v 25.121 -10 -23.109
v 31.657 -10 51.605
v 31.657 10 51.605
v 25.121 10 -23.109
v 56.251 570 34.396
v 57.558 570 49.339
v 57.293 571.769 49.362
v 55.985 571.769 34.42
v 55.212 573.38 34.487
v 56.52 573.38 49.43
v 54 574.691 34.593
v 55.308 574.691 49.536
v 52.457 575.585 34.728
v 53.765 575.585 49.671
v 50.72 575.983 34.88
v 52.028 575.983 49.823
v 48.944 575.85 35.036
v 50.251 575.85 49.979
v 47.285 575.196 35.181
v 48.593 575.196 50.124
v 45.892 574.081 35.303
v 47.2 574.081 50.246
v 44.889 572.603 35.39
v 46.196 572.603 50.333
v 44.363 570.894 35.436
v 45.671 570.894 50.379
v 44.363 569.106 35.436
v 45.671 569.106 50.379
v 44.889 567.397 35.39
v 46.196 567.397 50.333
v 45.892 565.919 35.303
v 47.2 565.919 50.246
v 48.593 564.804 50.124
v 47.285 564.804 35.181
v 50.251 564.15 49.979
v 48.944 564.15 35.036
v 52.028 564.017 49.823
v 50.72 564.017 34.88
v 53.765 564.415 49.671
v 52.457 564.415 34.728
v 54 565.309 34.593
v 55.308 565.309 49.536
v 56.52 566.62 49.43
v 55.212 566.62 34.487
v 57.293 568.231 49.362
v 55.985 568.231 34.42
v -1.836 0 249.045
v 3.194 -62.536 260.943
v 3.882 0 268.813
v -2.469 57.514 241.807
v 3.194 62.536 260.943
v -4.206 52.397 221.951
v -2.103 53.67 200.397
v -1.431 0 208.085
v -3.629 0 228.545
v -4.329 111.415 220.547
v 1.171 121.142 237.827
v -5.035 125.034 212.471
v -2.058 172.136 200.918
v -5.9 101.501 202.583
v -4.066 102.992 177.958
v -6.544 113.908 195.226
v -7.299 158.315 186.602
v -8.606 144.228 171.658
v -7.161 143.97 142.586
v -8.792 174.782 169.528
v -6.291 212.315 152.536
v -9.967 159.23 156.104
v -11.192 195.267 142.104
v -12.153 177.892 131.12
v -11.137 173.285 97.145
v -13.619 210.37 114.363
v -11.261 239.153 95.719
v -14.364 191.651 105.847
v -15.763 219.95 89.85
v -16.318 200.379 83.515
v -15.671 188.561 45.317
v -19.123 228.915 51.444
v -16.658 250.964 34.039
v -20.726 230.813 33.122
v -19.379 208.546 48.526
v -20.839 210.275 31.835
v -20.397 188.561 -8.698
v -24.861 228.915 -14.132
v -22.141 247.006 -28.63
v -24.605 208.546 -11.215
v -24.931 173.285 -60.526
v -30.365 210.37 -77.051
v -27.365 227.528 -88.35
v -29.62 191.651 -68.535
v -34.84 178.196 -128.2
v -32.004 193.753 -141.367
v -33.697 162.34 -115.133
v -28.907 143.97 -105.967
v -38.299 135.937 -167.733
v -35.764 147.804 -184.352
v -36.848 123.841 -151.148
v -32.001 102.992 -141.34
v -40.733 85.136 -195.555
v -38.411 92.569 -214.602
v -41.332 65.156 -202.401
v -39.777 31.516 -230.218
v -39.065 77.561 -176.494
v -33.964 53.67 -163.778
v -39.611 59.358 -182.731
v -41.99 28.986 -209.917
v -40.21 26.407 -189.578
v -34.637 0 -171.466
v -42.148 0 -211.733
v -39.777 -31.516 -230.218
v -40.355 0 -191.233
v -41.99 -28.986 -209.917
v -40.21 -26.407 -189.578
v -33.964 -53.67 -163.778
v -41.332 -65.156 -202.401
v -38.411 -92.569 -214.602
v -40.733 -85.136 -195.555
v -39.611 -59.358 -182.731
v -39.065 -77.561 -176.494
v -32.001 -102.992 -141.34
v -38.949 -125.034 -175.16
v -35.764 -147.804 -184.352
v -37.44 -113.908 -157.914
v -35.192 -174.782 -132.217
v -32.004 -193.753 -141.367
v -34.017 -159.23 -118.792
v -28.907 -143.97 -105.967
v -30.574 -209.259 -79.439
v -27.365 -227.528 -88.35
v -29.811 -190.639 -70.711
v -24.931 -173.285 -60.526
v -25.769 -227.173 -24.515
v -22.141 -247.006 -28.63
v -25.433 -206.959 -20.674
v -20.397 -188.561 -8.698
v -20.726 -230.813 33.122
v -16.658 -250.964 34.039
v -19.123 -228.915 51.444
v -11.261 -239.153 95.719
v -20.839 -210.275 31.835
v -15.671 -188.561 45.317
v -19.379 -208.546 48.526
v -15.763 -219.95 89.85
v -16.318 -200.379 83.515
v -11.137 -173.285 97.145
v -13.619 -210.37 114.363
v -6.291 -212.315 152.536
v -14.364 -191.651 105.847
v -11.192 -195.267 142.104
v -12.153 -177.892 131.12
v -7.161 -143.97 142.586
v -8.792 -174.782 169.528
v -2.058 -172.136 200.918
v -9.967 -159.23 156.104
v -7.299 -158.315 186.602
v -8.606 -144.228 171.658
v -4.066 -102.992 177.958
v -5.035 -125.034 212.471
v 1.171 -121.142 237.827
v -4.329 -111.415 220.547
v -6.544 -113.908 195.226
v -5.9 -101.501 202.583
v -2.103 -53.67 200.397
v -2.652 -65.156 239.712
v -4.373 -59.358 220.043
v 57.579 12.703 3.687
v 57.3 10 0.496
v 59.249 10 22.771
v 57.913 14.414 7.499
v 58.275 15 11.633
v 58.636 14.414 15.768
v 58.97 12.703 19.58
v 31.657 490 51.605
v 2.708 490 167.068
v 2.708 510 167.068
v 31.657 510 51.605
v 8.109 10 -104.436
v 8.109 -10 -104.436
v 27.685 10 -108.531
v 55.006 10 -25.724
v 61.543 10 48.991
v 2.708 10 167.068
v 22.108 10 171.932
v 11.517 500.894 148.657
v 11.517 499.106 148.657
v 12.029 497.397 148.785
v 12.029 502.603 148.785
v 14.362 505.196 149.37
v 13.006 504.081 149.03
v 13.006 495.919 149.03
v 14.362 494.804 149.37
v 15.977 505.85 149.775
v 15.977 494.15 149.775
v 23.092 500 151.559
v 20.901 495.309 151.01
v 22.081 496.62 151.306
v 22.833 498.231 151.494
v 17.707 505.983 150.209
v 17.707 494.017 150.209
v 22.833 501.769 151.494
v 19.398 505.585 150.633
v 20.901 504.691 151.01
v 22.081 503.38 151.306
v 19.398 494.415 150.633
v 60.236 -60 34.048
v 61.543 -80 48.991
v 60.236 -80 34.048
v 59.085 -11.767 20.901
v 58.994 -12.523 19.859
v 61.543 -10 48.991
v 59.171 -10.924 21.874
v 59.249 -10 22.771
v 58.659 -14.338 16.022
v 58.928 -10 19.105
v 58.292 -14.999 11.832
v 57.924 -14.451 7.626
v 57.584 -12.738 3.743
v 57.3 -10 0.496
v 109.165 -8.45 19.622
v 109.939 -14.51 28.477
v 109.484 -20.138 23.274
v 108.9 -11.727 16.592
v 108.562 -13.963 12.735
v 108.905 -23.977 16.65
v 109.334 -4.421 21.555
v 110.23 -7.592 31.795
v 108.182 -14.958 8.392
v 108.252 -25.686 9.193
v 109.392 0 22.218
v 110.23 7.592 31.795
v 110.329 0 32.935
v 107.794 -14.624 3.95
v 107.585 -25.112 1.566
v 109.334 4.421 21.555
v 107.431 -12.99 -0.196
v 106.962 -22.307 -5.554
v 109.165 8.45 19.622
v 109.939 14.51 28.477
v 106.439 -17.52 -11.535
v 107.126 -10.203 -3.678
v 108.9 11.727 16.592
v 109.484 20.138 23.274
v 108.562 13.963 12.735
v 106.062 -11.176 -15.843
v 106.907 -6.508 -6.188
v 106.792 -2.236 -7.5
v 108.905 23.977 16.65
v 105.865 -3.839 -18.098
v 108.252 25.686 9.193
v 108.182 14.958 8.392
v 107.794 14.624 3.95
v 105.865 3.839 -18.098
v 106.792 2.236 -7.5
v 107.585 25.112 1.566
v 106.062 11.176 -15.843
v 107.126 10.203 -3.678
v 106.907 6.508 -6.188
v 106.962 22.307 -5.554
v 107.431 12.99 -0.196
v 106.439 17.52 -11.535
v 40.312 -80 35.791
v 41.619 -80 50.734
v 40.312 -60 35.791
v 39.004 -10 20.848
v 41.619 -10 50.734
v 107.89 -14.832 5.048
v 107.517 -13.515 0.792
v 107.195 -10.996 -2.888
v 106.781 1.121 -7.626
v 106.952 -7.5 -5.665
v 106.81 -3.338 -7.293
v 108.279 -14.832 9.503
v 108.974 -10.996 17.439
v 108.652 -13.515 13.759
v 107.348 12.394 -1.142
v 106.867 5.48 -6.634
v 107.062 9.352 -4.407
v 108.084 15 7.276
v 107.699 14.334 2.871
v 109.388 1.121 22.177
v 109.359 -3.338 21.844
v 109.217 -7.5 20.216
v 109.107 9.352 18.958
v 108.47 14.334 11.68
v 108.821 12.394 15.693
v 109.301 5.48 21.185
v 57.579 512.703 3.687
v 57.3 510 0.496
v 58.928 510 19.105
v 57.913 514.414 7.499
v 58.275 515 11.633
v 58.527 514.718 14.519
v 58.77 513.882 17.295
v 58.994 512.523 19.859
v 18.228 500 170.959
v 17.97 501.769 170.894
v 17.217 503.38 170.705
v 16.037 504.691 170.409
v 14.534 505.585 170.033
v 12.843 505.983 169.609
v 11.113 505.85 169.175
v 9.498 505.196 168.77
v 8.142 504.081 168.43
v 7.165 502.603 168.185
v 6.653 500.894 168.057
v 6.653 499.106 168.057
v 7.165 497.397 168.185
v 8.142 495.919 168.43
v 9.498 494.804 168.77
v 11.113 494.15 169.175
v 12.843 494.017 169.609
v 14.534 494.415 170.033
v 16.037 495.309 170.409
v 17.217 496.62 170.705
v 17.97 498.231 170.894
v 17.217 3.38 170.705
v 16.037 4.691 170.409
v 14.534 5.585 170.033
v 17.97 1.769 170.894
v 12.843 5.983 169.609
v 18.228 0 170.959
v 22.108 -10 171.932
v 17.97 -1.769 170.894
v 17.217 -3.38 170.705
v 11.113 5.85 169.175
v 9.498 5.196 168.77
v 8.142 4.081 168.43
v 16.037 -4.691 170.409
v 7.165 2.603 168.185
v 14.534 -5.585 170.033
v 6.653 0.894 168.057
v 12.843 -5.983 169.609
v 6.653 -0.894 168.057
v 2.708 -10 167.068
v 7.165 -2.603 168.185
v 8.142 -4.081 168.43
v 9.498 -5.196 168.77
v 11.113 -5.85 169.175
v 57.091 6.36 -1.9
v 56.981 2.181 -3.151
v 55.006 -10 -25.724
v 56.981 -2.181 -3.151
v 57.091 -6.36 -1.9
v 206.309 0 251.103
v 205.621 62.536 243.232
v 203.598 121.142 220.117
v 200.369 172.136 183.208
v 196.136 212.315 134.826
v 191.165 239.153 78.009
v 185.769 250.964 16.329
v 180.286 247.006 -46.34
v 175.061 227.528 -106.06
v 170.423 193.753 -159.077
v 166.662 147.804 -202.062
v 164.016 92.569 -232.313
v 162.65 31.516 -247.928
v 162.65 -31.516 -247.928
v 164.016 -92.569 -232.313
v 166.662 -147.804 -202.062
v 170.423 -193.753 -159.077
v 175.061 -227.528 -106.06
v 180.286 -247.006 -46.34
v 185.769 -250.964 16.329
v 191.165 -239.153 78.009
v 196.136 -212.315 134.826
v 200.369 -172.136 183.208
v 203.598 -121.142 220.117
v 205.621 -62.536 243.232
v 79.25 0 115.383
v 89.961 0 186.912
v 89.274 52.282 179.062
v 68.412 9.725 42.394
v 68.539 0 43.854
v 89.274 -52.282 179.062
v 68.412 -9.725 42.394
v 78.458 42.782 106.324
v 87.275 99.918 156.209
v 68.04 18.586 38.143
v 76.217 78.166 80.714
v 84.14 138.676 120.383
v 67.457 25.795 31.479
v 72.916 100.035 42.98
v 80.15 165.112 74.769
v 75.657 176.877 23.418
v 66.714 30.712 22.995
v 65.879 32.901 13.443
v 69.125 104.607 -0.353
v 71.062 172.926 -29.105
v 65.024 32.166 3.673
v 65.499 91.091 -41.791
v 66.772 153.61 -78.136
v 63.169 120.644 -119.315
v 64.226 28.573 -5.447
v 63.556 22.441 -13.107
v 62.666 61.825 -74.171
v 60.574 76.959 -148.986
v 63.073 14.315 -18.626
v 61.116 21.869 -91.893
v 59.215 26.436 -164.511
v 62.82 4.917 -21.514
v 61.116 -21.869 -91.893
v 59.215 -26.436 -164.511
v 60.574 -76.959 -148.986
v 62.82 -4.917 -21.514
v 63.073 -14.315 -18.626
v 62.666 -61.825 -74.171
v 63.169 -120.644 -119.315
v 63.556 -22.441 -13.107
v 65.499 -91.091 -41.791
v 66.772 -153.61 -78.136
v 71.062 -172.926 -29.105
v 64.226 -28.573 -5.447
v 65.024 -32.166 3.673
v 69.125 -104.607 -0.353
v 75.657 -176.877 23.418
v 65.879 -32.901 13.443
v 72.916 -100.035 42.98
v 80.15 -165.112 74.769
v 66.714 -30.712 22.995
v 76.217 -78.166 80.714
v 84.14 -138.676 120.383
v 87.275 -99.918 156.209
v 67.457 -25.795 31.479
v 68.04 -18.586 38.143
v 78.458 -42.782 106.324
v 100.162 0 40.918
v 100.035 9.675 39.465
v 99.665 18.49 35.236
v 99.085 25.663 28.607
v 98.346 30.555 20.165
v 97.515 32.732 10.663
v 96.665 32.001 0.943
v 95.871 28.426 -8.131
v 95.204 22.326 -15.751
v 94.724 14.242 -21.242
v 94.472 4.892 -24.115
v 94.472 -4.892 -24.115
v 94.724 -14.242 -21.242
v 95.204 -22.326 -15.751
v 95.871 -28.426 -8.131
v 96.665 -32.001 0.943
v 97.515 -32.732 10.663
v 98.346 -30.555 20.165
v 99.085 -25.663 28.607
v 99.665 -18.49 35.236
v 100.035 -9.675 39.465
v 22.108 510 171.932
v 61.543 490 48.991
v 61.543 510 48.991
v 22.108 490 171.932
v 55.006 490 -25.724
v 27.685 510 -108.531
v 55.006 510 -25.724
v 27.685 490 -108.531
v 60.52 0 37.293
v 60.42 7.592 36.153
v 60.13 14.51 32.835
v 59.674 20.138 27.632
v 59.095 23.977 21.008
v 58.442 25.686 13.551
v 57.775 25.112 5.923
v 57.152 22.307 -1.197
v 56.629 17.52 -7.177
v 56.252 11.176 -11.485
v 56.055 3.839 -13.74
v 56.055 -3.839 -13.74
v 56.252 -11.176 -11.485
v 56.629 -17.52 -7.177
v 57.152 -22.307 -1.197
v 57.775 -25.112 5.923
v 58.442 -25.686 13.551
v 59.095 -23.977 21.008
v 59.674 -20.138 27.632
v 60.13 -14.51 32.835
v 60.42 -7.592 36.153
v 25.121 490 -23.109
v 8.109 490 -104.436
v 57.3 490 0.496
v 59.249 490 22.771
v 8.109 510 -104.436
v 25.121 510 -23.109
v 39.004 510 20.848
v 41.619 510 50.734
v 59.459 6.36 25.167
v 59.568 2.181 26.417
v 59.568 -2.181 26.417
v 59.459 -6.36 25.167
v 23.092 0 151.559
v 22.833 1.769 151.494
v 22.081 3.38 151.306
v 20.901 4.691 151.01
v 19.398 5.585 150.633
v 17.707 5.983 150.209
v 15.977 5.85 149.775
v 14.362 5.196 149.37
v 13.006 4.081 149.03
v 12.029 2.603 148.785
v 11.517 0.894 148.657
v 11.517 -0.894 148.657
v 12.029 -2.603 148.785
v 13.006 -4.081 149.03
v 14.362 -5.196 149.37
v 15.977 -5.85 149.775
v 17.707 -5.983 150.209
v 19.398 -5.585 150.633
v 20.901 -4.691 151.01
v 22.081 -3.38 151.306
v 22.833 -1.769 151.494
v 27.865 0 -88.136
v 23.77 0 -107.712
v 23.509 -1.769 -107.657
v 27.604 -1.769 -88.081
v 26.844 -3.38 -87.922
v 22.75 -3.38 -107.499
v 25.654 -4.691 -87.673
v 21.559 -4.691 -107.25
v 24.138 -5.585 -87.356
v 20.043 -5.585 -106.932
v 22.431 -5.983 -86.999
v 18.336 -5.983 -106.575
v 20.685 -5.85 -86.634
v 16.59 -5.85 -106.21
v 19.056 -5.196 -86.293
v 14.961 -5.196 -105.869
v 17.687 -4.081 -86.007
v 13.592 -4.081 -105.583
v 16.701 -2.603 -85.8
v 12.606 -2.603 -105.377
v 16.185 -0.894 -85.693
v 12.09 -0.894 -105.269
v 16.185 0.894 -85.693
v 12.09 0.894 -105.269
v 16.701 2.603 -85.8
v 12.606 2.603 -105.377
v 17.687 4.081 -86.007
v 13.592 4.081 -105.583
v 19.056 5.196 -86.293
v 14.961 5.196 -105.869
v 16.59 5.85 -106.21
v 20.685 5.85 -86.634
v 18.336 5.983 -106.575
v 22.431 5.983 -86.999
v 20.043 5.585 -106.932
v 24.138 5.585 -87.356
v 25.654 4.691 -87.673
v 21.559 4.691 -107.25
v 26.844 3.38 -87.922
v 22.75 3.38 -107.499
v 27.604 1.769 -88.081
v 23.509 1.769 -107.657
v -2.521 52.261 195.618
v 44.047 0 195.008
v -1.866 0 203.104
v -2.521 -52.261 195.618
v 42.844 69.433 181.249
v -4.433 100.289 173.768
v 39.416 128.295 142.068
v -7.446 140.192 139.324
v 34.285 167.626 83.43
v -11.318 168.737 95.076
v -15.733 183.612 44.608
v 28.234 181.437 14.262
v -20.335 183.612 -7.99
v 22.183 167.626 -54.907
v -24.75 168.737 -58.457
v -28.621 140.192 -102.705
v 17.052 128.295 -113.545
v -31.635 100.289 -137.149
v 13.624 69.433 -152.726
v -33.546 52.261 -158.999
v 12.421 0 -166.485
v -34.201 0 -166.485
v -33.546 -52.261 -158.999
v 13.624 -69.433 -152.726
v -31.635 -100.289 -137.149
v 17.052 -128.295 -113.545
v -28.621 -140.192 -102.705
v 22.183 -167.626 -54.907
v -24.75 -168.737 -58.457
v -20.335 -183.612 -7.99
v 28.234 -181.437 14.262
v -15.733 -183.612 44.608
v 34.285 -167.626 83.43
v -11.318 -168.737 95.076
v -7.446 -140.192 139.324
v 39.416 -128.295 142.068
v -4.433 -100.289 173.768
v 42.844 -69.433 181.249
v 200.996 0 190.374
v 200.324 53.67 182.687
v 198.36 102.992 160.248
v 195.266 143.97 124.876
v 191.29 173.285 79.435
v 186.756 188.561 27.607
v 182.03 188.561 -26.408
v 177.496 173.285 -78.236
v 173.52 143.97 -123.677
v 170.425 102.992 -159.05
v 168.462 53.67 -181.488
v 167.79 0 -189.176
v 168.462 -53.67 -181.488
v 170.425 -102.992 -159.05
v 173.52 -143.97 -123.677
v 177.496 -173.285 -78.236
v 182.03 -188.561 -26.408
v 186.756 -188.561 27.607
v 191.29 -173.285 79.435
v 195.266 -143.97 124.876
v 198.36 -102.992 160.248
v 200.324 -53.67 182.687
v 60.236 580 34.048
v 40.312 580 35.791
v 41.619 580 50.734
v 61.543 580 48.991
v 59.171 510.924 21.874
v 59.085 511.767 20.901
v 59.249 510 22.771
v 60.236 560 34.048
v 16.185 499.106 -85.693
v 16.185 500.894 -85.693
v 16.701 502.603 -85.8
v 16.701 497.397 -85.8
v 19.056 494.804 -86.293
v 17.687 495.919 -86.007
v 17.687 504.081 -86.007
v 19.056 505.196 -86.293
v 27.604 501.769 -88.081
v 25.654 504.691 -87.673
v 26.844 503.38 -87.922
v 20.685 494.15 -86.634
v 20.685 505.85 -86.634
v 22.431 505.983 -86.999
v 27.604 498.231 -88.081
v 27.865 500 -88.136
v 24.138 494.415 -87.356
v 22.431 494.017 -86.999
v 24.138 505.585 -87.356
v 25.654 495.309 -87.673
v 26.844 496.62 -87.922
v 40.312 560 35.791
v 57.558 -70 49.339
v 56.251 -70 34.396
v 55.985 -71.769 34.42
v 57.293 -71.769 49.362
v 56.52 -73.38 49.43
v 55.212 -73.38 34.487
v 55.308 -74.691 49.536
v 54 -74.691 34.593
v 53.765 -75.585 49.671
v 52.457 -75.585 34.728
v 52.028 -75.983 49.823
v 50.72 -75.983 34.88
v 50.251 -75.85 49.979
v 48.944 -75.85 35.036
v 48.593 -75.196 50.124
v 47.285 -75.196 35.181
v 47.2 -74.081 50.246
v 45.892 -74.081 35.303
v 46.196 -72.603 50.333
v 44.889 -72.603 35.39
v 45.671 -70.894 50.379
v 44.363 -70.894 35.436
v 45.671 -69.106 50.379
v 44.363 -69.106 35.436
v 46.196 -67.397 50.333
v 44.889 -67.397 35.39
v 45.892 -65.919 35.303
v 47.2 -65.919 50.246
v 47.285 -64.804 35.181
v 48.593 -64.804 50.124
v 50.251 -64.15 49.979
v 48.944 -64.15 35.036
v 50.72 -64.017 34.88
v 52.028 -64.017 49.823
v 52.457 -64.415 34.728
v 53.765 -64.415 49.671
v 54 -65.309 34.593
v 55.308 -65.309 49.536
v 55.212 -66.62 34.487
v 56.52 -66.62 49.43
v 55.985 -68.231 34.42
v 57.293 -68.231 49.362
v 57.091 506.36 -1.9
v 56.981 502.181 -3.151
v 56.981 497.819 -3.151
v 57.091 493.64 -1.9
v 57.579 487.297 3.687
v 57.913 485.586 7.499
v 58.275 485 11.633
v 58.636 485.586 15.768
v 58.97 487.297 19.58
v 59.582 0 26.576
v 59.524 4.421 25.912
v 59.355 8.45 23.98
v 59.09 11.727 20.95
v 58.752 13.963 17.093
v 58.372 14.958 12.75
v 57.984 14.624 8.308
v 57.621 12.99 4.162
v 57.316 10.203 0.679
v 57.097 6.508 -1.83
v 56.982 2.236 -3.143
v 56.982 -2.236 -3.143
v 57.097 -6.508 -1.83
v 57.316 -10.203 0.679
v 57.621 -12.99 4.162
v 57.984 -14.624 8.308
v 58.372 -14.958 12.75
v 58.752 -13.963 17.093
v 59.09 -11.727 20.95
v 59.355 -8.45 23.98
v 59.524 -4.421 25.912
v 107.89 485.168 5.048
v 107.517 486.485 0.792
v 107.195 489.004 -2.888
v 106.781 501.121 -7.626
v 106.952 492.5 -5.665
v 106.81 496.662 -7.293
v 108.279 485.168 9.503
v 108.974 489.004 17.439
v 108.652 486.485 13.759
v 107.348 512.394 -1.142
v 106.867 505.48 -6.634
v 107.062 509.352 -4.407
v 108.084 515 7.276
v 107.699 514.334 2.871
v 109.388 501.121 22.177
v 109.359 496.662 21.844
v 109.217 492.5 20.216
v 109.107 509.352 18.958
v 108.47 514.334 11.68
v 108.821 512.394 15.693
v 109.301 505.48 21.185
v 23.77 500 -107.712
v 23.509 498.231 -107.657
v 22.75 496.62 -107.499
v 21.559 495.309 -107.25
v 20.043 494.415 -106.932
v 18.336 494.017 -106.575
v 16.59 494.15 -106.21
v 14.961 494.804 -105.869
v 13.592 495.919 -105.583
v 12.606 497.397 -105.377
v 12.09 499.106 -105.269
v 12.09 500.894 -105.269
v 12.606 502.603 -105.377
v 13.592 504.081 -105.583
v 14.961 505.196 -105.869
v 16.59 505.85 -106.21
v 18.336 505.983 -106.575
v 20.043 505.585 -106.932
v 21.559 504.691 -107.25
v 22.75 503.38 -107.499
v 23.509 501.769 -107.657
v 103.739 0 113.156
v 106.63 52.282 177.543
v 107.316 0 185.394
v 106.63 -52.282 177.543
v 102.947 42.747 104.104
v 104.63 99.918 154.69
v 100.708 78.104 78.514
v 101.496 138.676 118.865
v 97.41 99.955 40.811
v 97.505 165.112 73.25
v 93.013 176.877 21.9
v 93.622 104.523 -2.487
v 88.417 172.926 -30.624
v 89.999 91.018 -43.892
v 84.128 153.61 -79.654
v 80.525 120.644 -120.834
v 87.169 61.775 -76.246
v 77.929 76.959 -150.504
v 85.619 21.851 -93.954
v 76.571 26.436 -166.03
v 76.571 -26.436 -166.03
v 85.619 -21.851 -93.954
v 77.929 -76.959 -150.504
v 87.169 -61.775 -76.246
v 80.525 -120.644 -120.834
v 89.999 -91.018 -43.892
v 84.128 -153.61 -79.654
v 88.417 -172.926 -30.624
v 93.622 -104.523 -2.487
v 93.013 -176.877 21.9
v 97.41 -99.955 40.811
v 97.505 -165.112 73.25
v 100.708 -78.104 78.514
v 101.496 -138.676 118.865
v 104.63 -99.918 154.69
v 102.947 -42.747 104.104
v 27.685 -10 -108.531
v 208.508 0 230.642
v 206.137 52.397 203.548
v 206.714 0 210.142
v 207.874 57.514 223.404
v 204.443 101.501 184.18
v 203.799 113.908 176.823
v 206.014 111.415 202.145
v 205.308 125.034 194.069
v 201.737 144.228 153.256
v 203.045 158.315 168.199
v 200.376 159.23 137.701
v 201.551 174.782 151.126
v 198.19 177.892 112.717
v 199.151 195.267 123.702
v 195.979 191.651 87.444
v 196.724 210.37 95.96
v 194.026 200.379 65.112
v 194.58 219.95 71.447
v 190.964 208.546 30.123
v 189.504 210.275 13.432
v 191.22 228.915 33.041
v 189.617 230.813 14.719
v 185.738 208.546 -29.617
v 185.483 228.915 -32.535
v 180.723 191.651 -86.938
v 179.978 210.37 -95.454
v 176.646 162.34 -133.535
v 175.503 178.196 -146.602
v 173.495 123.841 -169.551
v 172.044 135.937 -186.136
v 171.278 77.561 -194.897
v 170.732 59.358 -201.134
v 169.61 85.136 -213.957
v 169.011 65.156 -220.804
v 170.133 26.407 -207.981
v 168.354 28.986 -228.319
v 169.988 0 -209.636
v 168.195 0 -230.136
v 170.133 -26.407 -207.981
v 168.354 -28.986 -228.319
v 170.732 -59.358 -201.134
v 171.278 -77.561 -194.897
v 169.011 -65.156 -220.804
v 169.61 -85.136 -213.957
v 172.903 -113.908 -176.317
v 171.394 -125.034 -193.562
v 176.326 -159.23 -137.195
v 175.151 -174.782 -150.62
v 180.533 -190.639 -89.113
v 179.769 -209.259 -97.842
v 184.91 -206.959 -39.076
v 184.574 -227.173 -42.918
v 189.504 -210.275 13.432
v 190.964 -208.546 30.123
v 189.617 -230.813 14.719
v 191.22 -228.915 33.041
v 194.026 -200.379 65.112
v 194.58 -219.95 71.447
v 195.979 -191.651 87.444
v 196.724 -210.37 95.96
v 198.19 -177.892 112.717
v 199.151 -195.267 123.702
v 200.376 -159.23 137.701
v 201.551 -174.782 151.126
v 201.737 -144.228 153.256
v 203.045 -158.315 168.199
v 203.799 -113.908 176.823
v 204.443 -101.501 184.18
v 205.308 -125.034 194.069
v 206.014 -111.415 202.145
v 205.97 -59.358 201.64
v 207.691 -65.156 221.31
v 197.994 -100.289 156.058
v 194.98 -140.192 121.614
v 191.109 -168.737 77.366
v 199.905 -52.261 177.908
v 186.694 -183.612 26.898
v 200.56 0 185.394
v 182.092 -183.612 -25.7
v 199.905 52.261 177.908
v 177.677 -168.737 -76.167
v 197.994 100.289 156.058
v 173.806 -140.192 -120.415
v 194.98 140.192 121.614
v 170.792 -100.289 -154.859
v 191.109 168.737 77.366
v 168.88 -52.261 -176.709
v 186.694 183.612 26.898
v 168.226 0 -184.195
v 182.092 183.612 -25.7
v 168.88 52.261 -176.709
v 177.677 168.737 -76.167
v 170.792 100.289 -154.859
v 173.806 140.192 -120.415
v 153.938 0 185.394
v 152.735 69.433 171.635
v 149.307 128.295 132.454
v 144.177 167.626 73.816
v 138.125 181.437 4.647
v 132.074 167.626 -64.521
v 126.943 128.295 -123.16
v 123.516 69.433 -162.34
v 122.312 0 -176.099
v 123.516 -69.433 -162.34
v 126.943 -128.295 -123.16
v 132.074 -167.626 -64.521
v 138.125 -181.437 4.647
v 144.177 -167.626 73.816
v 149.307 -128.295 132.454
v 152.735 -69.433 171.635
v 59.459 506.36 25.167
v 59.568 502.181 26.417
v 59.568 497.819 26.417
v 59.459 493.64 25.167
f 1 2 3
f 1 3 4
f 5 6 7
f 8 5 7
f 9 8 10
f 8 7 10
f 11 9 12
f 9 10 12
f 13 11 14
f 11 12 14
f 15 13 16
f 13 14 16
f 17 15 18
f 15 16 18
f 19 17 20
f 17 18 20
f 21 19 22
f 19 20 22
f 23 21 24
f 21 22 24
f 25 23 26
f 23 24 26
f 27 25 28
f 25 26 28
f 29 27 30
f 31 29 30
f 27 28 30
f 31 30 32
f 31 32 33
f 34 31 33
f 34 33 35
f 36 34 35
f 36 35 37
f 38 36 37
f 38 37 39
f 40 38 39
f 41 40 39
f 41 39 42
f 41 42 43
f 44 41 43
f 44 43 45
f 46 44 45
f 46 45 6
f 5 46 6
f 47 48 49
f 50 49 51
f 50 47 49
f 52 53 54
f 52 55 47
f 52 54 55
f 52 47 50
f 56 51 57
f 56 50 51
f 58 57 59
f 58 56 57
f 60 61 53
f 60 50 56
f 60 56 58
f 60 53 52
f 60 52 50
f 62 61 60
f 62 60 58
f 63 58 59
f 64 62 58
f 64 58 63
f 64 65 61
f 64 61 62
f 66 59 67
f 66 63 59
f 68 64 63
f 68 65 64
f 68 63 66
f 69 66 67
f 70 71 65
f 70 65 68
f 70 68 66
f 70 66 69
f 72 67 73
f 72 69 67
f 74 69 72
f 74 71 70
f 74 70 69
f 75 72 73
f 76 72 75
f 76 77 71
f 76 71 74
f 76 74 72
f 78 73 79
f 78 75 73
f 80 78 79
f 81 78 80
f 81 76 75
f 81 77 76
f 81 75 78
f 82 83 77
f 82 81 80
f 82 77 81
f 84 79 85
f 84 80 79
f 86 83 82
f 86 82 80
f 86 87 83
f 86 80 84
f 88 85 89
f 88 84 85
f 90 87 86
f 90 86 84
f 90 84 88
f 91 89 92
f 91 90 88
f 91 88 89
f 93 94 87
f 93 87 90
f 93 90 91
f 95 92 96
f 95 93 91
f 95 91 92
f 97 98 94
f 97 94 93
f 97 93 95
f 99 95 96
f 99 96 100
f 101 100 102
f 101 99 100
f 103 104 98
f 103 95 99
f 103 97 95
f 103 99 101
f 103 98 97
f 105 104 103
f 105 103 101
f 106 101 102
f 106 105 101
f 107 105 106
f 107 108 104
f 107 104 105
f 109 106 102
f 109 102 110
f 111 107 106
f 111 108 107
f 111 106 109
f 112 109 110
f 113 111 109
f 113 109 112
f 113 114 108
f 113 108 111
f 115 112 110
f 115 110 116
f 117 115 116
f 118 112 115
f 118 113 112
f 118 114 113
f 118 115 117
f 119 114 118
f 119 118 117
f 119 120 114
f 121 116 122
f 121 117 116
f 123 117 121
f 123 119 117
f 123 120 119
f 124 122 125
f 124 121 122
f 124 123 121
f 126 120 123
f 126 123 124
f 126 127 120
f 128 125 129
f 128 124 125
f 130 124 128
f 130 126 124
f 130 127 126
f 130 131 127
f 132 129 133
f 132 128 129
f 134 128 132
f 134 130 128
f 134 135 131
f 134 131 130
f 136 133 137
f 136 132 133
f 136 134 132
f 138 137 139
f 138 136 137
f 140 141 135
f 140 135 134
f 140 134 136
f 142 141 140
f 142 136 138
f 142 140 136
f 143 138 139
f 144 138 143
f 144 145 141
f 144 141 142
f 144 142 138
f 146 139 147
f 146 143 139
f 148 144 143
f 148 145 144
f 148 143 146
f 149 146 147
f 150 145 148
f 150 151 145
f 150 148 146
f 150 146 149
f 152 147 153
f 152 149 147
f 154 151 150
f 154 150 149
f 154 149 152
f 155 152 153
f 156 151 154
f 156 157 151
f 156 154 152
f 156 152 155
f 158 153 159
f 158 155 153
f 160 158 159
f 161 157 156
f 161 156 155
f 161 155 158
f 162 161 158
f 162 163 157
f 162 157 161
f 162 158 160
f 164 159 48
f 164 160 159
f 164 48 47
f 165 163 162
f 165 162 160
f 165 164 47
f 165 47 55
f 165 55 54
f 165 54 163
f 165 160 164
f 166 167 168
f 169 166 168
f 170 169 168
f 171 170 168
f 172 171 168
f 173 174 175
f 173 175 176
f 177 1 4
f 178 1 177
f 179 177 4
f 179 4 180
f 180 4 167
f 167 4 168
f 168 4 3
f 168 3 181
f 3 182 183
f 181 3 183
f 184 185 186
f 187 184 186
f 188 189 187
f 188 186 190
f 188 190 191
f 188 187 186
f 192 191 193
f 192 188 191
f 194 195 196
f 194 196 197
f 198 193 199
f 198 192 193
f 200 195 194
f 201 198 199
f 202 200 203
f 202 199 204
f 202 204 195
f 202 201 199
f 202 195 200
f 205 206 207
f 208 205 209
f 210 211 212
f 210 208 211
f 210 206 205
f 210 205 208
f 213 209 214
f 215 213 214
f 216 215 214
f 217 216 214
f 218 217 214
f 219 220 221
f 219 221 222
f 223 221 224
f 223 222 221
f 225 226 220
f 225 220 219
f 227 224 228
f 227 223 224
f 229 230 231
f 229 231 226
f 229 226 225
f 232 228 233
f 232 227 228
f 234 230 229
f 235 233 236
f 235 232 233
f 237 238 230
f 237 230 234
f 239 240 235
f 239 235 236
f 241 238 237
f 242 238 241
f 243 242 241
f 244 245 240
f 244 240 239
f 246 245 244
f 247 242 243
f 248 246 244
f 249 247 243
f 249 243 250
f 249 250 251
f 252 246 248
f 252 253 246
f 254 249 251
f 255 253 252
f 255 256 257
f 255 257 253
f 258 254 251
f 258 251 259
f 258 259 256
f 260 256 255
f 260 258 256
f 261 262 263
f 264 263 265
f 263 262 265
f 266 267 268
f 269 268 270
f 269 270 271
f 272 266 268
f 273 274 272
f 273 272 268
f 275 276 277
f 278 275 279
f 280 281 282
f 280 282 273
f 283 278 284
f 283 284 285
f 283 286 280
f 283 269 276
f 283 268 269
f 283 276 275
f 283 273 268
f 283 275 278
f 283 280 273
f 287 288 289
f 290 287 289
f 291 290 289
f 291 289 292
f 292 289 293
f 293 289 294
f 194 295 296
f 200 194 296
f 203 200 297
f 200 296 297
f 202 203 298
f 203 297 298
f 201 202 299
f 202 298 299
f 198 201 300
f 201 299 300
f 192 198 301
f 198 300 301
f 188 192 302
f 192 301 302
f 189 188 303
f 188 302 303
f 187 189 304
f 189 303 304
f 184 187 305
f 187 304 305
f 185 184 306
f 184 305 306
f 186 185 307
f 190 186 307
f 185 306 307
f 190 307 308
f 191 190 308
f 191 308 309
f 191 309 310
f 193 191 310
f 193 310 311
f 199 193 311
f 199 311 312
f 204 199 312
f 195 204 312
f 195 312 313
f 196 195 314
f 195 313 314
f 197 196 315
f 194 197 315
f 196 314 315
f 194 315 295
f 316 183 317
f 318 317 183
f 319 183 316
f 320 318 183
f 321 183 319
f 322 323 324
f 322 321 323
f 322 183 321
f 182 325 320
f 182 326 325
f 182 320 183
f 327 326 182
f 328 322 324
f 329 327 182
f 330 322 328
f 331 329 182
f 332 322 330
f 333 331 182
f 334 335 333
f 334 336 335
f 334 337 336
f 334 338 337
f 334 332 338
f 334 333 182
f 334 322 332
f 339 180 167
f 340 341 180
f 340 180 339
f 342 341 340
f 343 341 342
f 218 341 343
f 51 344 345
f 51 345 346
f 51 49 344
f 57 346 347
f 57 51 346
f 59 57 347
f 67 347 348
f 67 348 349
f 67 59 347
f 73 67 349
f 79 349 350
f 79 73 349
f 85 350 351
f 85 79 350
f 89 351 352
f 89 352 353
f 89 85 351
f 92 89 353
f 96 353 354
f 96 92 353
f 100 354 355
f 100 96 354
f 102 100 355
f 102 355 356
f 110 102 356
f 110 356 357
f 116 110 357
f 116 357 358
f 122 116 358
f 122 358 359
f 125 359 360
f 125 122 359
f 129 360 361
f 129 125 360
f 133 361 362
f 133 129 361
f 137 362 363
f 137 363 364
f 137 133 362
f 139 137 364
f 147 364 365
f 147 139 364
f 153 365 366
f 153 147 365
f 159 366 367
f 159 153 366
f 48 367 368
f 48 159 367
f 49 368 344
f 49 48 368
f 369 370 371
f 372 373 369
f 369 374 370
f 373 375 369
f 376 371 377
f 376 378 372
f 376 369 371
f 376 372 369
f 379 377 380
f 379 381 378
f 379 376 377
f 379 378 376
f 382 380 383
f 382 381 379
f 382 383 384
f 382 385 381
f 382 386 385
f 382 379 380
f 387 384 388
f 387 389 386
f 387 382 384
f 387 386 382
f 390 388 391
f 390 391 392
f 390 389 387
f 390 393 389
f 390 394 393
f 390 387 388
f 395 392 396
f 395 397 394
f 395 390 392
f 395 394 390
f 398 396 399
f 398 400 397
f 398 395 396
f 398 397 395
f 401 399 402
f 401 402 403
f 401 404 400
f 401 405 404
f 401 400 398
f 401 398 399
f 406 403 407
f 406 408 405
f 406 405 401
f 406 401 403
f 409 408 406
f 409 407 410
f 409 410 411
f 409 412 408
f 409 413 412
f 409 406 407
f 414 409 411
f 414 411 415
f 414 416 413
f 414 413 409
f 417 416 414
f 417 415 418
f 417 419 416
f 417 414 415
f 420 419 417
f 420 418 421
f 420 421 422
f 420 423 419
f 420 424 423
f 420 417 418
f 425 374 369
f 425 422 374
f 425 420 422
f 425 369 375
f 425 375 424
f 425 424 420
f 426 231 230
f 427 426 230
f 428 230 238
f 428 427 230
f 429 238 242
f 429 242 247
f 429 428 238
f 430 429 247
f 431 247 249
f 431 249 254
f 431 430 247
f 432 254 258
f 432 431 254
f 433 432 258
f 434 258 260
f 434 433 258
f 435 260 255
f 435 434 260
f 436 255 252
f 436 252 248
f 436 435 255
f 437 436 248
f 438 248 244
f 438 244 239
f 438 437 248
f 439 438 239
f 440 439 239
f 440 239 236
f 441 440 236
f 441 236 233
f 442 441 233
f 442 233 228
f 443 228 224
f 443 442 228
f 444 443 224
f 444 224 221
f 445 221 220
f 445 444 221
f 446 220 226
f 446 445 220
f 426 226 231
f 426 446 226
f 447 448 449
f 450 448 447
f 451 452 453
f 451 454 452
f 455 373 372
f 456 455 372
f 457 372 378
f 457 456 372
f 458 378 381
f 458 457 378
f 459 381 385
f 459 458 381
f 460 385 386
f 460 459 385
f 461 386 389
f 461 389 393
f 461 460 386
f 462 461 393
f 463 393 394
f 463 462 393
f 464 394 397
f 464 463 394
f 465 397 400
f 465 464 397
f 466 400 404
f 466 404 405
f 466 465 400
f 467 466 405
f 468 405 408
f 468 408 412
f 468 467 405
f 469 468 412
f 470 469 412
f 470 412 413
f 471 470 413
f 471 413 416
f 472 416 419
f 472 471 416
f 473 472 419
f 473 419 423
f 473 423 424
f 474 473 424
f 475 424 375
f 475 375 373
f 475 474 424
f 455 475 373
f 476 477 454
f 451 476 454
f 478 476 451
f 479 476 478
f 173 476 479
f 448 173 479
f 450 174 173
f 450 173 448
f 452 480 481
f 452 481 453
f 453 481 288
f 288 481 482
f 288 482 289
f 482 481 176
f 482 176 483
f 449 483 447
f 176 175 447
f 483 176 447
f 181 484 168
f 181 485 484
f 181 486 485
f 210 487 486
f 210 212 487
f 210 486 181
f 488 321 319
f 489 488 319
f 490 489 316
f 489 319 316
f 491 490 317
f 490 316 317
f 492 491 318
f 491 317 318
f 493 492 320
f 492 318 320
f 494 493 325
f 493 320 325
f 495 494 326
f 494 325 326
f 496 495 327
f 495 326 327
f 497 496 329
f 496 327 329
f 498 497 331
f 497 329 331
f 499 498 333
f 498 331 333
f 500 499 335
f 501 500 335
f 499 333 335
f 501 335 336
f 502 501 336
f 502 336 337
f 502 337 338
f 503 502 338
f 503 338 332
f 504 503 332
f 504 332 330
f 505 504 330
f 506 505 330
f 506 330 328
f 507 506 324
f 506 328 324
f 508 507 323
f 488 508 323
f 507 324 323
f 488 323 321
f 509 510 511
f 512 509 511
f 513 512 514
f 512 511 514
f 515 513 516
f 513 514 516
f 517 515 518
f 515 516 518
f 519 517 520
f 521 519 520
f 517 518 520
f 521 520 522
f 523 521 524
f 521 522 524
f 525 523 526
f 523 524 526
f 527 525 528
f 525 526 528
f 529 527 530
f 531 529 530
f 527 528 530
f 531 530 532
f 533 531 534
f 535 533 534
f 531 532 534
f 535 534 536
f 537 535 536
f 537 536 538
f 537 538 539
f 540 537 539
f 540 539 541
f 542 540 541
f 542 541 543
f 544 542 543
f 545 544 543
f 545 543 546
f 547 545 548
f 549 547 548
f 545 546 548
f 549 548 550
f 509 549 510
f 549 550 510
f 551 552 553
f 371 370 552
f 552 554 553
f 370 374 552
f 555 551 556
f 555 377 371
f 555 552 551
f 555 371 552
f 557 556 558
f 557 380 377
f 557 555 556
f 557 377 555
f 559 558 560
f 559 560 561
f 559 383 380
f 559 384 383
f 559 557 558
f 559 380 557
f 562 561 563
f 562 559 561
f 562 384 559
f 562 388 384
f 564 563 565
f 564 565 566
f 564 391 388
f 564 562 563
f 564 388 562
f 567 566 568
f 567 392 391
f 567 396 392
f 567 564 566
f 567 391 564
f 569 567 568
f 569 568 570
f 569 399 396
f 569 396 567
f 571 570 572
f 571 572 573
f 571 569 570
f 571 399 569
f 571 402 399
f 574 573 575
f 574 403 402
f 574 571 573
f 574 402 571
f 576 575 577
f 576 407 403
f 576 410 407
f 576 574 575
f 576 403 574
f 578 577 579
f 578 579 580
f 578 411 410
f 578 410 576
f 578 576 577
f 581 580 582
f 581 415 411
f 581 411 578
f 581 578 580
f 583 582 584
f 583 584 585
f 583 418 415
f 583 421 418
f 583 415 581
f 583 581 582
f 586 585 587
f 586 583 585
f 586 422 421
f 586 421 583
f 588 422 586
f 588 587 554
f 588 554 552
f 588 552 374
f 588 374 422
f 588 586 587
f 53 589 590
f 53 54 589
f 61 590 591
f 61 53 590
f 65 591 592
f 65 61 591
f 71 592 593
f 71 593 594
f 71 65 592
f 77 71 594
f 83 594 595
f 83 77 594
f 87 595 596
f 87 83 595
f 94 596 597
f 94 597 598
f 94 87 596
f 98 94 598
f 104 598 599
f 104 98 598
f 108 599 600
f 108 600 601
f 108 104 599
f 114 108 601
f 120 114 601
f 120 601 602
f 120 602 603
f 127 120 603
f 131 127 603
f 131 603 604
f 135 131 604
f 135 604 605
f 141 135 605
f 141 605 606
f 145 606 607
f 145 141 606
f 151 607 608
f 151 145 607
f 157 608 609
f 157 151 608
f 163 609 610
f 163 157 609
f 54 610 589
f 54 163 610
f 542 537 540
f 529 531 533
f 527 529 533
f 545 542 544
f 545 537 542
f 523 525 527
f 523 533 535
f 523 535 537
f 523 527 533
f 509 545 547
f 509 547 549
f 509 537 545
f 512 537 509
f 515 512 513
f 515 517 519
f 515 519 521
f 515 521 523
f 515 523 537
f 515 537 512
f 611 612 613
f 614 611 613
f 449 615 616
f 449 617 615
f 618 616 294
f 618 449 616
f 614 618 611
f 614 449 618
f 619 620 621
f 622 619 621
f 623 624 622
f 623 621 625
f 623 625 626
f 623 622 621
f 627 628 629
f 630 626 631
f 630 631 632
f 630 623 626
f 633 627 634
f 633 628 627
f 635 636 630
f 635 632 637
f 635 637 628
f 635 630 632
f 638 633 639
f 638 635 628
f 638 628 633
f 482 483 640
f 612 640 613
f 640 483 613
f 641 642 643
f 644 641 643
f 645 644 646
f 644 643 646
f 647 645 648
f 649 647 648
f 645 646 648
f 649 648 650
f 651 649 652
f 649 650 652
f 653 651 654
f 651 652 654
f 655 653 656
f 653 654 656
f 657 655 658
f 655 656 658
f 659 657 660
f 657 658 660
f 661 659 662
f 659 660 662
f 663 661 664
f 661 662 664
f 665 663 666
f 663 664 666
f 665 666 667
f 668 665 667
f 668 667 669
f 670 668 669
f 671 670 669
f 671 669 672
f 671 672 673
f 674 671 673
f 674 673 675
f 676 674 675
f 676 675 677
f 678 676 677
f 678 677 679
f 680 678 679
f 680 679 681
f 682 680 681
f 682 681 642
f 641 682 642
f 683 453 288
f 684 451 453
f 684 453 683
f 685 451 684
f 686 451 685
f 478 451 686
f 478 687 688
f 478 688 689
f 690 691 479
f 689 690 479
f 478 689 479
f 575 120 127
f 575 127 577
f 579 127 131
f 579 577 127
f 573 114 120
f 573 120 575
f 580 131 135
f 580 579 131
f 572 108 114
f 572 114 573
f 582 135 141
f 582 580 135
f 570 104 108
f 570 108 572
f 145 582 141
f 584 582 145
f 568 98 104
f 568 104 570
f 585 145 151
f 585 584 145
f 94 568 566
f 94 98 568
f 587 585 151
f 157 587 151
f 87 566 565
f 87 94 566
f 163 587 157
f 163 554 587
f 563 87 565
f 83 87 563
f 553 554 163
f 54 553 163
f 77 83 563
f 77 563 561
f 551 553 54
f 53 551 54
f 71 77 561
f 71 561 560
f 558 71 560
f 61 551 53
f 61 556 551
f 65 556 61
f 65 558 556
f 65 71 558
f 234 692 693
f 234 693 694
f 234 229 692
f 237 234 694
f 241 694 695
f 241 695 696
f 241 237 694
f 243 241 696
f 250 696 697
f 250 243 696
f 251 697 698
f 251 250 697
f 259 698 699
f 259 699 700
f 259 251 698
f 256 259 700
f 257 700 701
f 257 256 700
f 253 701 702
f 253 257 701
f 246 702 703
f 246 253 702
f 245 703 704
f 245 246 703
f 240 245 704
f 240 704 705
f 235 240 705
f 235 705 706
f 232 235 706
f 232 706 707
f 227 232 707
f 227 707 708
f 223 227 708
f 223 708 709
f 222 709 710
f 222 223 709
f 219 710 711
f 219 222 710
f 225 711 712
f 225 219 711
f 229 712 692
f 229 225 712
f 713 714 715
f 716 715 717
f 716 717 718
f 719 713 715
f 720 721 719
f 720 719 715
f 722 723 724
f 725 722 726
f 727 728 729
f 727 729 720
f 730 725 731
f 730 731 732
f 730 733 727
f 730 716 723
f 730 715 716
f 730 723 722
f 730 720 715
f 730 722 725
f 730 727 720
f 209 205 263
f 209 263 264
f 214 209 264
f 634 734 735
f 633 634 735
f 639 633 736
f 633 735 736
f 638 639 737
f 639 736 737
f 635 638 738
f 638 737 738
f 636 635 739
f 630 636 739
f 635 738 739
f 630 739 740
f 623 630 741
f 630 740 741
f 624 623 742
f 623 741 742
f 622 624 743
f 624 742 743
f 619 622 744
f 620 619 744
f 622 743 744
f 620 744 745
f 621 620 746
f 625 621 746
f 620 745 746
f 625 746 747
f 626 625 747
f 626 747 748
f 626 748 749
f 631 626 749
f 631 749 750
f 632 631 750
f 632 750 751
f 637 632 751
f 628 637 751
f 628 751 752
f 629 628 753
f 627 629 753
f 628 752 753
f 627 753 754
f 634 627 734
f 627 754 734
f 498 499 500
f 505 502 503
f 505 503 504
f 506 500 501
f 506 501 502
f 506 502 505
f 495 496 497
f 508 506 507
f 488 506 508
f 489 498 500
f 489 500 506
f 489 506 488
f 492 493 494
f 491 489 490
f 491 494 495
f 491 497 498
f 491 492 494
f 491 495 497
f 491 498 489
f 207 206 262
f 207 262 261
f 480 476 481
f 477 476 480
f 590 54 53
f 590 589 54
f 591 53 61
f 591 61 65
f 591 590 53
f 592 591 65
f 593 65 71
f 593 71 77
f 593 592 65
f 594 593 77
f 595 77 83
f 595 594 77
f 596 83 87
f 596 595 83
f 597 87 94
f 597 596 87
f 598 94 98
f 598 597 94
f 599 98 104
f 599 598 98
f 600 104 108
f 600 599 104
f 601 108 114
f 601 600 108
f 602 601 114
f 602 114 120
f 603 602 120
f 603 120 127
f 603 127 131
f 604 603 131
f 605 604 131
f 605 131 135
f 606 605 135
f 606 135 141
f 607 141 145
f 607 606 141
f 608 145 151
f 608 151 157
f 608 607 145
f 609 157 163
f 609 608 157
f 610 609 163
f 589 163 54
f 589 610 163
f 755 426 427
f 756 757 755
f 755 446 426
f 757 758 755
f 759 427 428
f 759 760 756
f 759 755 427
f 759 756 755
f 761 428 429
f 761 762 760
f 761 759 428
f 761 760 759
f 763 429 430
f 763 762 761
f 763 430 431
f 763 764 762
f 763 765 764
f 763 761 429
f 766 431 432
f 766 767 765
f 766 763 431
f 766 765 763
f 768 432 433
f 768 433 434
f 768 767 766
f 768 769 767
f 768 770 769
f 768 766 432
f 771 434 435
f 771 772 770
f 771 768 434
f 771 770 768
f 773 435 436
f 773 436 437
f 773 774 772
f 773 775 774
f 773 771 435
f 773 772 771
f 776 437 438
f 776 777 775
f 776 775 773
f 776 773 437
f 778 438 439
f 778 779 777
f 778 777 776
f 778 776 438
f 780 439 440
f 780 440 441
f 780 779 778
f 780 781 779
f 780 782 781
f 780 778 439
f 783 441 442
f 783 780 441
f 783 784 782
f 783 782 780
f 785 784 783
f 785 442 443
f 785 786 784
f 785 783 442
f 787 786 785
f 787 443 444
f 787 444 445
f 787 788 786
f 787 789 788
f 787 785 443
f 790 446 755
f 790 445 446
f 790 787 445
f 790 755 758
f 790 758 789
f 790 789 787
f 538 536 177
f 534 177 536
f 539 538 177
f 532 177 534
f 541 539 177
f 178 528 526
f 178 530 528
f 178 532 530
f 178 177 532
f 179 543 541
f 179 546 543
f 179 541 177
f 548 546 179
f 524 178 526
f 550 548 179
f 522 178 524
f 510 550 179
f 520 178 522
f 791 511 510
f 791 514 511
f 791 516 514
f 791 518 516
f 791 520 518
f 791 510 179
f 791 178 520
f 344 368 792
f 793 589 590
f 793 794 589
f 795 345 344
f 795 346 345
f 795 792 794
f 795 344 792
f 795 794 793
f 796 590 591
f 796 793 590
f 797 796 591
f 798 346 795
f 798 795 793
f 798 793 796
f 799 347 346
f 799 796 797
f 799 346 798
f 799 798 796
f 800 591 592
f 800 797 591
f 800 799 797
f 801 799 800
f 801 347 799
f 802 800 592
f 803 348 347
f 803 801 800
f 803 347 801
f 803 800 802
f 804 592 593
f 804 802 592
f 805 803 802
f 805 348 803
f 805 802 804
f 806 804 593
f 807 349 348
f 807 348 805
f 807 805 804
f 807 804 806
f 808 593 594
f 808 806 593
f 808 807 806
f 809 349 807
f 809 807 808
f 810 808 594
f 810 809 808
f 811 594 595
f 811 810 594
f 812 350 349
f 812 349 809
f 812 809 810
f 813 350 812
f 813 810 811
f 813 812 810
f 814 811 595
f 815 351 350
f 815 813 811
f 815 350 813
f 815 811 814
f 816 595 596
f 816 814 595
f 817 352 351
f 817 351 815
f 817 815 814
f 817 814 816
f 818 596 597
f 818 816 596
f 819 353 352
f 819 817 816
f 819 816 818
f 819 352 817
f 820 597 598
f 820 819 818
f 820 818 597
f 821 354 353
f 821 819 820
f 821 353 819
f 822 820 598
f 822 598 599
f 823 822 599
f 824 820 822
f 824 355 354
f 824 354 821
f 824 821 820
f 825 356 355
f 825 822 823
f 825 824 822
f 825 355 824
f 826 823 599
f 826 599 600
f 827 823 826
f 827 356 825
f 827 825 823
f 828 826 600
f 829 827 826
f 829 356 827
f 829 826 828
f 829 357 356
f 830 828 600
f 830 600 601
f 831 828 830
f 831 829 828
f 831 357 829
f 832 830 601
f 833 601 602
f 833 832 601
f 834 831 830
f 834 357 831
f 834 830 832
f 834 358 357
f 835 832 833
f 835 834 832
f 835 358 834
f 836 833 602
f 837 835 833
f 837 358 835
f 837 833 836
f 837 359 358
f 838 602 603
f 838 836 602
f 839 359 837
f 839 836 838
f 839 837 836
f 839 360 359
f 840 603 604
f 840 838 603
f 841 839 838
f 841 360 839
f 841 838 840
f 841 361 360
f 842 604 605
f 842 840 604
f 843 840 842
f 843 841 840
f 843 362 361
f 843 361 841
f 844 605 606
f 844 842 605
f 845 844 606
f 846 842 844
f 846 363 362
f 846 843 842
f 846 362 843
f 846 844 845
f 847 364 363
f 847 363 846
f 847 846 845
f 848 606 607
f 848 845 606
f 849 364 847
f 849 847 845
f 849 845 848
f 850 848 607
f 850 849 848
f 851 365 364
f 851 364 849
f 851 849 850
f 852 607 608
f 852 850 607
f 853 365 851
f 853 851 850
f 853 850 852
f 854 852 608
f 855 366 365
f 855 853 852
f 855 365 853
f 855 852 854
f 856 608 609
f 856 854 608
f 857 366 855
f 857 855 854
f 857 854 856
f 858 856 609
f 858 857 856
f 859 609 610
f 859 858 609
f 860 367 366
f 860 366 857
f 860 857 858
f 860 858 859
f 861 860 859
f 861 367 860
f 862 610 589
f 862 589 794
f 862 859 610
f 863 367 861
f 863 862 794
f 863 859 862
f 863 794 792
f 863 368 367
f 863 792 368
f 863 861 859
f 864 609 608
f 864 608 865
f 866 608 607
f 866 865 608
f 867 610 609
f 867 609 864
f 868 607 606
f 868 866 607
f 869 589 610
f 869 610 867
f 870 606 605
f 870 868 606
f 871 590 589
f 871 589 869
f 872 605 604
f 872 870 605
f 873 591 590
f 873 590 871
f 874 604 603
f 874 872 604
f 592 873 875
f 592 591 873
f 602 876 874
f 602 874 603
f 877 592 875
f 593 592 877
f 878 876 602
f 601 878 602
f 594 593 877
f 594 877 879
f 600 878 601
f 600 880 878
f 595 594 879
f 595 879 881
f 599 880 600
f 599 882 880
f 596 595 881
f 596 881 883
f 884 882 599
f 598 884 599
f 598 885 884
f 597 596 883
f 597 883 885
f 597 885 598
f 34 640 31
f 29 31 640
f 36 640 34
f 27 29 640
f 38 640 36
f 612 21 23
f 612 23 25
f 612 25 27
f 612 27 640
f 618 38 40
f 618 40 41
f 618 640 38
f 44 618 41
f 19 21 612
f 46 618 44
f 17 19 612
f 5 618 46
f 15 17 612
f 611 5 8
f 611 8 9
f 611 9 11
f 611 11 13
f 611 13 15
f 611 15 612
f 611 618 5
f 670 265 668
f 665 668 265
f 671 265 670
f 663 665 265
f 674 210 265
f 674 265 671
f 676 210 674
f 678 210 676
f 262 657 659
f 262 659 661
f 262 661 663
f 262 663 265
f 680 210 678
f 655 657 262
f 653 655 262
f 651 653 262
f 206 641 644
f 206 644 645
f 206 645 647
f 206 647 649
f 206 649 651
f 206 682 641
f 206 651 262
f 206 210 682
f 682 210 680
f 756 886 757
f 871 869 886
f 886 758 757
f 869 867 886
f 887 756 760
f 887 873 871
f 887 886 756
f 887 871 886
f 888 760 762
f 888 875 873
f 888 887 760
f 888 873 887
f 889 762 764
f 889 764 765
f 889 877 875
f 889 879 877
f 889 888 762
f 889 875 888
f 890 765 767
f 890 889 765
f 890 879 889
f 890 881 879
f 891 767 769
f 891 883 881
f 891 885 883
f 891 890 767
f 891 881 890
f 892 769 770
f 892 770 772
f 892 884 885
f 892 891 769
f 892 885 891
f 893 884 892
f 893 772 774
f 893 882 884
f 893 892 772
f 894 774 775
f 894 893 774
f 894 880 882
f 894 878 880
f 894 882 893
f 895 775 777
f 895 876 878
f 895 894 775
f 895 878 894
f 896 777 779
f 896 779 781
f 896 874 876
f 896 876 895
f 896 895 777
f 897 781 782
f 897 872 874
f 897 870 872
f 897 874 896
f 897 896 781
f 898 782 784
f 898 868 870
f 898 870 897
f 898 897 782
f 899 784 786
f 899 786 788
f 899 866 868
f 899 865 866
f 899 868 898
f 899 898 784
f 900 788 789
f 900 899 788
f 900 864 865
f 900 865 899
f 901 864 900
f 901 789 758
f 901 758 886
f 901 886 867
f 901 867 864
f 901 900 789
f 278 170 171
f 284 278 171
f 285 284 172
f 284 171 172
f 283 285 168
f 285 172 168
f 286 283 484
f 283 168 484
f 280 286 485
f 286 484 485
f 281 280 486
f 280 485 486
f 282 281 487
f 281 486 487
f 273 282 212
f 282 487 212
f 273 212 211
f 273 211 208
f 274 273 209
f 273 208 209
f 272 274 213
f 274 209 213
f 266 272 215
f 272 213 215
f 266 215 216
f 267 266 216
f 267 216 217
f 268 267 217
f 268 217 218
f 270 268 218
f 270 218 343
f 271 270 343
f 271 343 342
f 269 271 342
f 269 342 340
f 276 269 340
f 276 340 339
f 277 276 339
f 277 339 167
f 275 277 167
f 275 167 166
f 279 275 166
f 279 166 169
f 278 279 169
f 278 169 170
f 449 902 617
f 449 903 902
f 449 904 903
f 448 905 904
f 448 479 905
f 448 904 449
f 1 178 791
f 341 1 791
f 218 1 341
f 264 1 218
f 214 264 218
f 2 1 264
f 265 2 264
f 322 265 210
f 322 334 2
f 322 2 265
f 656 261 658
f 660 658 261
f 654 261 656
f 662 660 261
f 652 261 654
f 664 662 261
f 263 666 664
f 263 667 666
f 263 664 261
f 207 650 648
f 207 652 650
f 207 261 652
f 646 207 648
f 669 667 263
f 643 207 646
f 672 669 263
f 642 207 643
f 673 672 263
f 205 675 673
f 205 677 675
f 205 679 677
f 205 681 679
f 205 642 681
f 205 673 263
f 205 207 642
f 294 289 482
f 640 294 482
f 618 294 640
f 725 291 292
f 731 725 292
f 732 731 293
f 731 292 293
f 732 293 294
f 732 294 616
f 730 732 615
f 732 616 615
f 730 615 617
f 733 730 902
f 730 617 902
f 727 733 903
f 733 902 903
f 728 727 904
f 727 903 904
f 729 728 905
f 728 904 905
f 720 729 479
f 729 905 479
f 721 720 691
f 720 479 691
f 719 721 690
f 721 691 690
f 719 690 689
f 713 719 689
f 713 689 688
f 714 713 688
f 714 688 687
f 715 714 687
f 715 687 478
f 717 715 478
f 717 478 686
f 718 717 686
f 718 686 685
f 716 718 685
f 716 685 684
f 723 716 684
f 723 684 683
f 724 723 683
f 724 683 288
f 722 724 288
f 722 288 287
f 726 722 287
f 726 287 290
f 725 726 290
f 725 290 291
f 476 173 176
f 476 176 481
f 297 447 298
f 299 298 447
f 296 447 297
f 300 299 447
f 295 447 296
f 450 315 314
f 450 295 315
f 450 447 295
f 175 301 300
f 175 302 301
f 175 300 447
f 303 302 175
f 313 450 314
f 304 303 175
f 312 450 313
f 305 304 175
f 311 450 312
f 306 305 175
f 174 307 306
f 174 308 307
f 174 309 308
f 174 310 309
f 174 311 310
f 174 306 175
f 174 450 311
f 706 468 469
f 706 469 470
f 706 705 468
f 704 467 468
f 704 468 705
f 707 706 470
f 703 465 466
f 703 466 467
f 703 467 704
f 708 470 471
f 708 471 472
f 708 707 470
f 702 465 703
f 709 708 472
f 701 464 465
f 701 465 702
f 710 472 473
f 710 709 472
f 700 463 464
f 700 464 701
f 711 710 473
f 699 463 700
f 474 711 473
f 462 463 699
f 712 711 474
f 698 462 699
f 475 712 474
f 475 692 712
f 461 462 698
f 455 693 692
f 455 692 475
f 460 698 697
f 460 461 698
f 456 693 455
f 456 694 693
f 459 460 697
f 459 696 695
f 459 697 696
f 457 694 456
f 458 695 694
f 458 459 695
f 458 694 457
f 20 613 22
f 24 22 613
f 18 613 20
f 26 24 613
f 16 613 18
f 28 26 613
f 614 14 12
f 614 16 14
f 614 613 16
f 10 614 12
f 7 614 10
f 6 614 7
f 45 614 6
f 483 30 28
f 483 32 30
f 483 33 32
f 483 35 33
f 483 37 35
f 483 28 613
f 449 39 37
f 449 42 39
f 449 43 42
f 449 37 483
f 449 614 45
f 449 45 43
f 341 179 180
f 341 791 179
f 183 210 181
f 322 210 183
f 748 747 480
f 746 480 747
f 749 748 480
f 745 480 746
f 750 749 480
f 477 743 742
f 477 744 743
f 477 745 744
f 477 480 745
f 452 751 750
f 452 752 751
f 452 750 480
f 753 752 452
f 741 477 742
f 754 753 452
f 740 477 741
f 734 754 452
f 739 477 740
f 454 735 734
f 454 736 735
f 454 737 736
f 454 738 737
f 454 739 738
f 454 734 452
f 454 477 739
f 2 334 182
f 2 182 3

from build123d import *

# Parameters (mm, degrees)
F1_DEPTH  = 10
F2_R      = 15
F3_DEPTH  = 50
F6_DEPTH  = 20
F7_R      = 6
F8_DEPTH  = 141.6444196144
F9_R      = 6
F10_DEPTH = 20
F11_R     = 6
F12_DEPTH = 20
F18_DEPTH = 20
F19_R     = 6
F20_DEPTH = 306.7957135
F21_R     = 6
F22_DEPTH = 20
F23_R     = 6
F24_DEPTH = 20


with BuildPart() as f1:
    # F0 (on Front) → F1 (new body, symmetric)
    with BuildSketch(Plane.XZ):
        Polygon((61.5430337565, 48.9906095336), (22.1079817602, 171.9315649371), (2.7084239419, 167.0677026389), (31.6571928137, 51.605281816), (25.1205121076, -23.1093205409), (8.1089686022, -104.4361399324), (27.6852804739, -108.5310164267), (55.0063530504, -25.7239928233), align=None)
    extrude(amount=F1_DEPTH, both=True)

    # F2 (on face) → F3 (join)
    with BuildSketch(Plane(origin=(56.8219802377, 0, -4.9712791099), x_dir=(0, 1, 0), z_dir=(0.9961946981, 0, -0.0871557427))):
        with Locations((0, 16.6680142916)):
            Circle(F2_R)
    extrude(amount=F3_DEPTH)


with BuildPart() as f4_1:
    # F4: copy of F1
    add(f1.part.moved(Location((0, 500, 0))))

    # F17 (on face) → F18 (join)
    with BuildSketch(Plane(origin=(56.8219802377, 0, -4.9712791099), x_dir=(0, 1, 0), z_dir=(0.9961946981, 0, -0.0871557427))):
        Polygon((580, 54.1680142916), (510, 54.1680142916), (510, 24.1680142916), (560, 39.1680142916), (580, 39.1680142916), align=None)
    extrude(amount=-F18_DEPTH)

    # F19 (on face) → F20 (cut, through all)
    with BuildSketch(Plane(origin=(4.7210535188, 0, 53.9618886435), x_dir=(0.9961946981, 0, -0.0871557427), z_dir=(0.0871557427, 0, 0.9961946981))):
        with Locations((47.0390309711, 570)):
            Circle(F19_R)
    extrude(amount=-F20_DEPTH, mode=Mode.SUBTRACT)

    # F21 (on face) → F22 (cut)
    with BuildSketch(Plane(origin=(-39.249741247, 0, 156.5479402982), x_dir=(0.9699778909, 0, 0.2431931149), z_dir=(-0.2431931149, 0, 0.9699778909))):
        with Locations((53.2568263483, 500)):
            Circle(F21_R)
    extrude(amount=-F22_DEPTH, mode=Mode.SUBTRACT)

    # F23 (on face) → F24 (cut)
    with BuildSketch(Plane(origin=(-20.5897476425, 0, -98.4330838237), x_dir=(0.9788155936, 0, -0.2047438247), z_dir=(-0.2047438247, 0, -0.9788155936))):
        with Locations((39.3198396438, -500)):
            Circle(F23_R)
    extrude(amount=-F24_DEPTH, mode=Mode.SUBTRACT)


with BuildPart() as f1_1:
    add(f1.part)

    # F5 (on face) → F6 (join)
    with BuildSketch(Plane(origin=(56.8219802377, 0, -4.9712791099), x_dir=(0, 1, 0), z_dir=(0.9961946981, 0, -0.0871557427))):
        Polygon((-10, 27.8483541791), (-10, 54.1680142916), (-80, 54.1680142916), (-80, 39.1680142916), (-60, 39.1680142916), (-10, 24.1680142916), align=None)
    extrude(amount=-F6_DEPTH)

    # F7 (on face) → F8 (cut, through all)
    with BuildSketch(Plane(origin=(3.4137173775, 0, 39.0189681721), x_dir=(0.9961946981, 0, -0.0871557427), z_dir=(-0.0871557427, 0, -0.9961946981))):
        with Locations((47.0390309711, 70)):
            Circle(F7_R)
    extrude(amount=-F8_DEPTH, mode=Mode.SUBTRACT)

    # F9 (on face) → F10 (cut)
    with BuildSketch(Plane(origin=(-39.249741247, 0, 156.5479402982), x_dir=(0.9699778909, 0, 0.2431931149), z_dir=(-0.2431931149, 0, 0.9699778909))):
        with Locations((53.2568263483, 0)):
            Circle(F9_R)
    extrude(amount=-F10_DEPTH, mode=Mode.SUBTRACT)

    # F11 (on face) → F12 (cut)
    with BuildSketch(Plane(origin=(-20.5897476425, 0, -98.4330838237), x_dir=(0.9788155936, 0, -0.2047438247), z_dir=(-0.2047438247, 0, -0.9788155936))):
        with Locations((39.3198396438, 0)):
            Circle(F11_R)
    extrude(amount=-F12_DEPTH, mode=Mode.SUBTRACT)


with BuildPart() as f14:
    # F13 (on Front) → F14 (revolve)
    with BuildSketch(Plane.XZ):
        Polygon((60.5196446488, 37.2932185069), (59.5820295446, 26.5762288265), (109.3917644492, 22.2184416891), (110.3293795534, 32.9354313695), (100.1619629103, 40.9180785076), (107.3164212677, 185.3935078193), (200.5603324615, 185.3935078193), (200.9961111753, 190.3744813098), (-1.430651477, 208.0845282361), (-1.8664301907, 203.1035547456), (89.9608964742, 186.9119194883), (68.5394343396, 43.8543894201), align=None)
    revolve(axis=Axis((58.2746934034, 0, 11.6333083551), (-0.9961946981, 0, 0.0871557427)))


with BuildPart() as f16:
    # F15 (on Front) → F16 (revolve)
    with BuildSketch(Plane.XZ):
        with BuildLine():
            Line((206.3091252532, 251.1025101054), (3.8823626009, 268.8125570317))
            ThreePointArc((3.8823626009, 268.8125570317), (-3.2306354967, 238.8384350806), (-1.430651477, 208.0845282361))
            Line((-1.430651477, 208.0845282361), (200.9961111753, 190.3744813098))
            ThreePointArc((200.9961111753, 190.3744813098), (208.1091092729, 220.3486032608), (206.3091252532, 251.1025101054))
        make_face()
    revolve(axis=Axis((184.3929421818, 0, 0.5993913233), (-0.9961946981, 0, 0.0871557427)))


solid = Compound([f4_1.part, f1_1.part, f14.part, f16.part])
